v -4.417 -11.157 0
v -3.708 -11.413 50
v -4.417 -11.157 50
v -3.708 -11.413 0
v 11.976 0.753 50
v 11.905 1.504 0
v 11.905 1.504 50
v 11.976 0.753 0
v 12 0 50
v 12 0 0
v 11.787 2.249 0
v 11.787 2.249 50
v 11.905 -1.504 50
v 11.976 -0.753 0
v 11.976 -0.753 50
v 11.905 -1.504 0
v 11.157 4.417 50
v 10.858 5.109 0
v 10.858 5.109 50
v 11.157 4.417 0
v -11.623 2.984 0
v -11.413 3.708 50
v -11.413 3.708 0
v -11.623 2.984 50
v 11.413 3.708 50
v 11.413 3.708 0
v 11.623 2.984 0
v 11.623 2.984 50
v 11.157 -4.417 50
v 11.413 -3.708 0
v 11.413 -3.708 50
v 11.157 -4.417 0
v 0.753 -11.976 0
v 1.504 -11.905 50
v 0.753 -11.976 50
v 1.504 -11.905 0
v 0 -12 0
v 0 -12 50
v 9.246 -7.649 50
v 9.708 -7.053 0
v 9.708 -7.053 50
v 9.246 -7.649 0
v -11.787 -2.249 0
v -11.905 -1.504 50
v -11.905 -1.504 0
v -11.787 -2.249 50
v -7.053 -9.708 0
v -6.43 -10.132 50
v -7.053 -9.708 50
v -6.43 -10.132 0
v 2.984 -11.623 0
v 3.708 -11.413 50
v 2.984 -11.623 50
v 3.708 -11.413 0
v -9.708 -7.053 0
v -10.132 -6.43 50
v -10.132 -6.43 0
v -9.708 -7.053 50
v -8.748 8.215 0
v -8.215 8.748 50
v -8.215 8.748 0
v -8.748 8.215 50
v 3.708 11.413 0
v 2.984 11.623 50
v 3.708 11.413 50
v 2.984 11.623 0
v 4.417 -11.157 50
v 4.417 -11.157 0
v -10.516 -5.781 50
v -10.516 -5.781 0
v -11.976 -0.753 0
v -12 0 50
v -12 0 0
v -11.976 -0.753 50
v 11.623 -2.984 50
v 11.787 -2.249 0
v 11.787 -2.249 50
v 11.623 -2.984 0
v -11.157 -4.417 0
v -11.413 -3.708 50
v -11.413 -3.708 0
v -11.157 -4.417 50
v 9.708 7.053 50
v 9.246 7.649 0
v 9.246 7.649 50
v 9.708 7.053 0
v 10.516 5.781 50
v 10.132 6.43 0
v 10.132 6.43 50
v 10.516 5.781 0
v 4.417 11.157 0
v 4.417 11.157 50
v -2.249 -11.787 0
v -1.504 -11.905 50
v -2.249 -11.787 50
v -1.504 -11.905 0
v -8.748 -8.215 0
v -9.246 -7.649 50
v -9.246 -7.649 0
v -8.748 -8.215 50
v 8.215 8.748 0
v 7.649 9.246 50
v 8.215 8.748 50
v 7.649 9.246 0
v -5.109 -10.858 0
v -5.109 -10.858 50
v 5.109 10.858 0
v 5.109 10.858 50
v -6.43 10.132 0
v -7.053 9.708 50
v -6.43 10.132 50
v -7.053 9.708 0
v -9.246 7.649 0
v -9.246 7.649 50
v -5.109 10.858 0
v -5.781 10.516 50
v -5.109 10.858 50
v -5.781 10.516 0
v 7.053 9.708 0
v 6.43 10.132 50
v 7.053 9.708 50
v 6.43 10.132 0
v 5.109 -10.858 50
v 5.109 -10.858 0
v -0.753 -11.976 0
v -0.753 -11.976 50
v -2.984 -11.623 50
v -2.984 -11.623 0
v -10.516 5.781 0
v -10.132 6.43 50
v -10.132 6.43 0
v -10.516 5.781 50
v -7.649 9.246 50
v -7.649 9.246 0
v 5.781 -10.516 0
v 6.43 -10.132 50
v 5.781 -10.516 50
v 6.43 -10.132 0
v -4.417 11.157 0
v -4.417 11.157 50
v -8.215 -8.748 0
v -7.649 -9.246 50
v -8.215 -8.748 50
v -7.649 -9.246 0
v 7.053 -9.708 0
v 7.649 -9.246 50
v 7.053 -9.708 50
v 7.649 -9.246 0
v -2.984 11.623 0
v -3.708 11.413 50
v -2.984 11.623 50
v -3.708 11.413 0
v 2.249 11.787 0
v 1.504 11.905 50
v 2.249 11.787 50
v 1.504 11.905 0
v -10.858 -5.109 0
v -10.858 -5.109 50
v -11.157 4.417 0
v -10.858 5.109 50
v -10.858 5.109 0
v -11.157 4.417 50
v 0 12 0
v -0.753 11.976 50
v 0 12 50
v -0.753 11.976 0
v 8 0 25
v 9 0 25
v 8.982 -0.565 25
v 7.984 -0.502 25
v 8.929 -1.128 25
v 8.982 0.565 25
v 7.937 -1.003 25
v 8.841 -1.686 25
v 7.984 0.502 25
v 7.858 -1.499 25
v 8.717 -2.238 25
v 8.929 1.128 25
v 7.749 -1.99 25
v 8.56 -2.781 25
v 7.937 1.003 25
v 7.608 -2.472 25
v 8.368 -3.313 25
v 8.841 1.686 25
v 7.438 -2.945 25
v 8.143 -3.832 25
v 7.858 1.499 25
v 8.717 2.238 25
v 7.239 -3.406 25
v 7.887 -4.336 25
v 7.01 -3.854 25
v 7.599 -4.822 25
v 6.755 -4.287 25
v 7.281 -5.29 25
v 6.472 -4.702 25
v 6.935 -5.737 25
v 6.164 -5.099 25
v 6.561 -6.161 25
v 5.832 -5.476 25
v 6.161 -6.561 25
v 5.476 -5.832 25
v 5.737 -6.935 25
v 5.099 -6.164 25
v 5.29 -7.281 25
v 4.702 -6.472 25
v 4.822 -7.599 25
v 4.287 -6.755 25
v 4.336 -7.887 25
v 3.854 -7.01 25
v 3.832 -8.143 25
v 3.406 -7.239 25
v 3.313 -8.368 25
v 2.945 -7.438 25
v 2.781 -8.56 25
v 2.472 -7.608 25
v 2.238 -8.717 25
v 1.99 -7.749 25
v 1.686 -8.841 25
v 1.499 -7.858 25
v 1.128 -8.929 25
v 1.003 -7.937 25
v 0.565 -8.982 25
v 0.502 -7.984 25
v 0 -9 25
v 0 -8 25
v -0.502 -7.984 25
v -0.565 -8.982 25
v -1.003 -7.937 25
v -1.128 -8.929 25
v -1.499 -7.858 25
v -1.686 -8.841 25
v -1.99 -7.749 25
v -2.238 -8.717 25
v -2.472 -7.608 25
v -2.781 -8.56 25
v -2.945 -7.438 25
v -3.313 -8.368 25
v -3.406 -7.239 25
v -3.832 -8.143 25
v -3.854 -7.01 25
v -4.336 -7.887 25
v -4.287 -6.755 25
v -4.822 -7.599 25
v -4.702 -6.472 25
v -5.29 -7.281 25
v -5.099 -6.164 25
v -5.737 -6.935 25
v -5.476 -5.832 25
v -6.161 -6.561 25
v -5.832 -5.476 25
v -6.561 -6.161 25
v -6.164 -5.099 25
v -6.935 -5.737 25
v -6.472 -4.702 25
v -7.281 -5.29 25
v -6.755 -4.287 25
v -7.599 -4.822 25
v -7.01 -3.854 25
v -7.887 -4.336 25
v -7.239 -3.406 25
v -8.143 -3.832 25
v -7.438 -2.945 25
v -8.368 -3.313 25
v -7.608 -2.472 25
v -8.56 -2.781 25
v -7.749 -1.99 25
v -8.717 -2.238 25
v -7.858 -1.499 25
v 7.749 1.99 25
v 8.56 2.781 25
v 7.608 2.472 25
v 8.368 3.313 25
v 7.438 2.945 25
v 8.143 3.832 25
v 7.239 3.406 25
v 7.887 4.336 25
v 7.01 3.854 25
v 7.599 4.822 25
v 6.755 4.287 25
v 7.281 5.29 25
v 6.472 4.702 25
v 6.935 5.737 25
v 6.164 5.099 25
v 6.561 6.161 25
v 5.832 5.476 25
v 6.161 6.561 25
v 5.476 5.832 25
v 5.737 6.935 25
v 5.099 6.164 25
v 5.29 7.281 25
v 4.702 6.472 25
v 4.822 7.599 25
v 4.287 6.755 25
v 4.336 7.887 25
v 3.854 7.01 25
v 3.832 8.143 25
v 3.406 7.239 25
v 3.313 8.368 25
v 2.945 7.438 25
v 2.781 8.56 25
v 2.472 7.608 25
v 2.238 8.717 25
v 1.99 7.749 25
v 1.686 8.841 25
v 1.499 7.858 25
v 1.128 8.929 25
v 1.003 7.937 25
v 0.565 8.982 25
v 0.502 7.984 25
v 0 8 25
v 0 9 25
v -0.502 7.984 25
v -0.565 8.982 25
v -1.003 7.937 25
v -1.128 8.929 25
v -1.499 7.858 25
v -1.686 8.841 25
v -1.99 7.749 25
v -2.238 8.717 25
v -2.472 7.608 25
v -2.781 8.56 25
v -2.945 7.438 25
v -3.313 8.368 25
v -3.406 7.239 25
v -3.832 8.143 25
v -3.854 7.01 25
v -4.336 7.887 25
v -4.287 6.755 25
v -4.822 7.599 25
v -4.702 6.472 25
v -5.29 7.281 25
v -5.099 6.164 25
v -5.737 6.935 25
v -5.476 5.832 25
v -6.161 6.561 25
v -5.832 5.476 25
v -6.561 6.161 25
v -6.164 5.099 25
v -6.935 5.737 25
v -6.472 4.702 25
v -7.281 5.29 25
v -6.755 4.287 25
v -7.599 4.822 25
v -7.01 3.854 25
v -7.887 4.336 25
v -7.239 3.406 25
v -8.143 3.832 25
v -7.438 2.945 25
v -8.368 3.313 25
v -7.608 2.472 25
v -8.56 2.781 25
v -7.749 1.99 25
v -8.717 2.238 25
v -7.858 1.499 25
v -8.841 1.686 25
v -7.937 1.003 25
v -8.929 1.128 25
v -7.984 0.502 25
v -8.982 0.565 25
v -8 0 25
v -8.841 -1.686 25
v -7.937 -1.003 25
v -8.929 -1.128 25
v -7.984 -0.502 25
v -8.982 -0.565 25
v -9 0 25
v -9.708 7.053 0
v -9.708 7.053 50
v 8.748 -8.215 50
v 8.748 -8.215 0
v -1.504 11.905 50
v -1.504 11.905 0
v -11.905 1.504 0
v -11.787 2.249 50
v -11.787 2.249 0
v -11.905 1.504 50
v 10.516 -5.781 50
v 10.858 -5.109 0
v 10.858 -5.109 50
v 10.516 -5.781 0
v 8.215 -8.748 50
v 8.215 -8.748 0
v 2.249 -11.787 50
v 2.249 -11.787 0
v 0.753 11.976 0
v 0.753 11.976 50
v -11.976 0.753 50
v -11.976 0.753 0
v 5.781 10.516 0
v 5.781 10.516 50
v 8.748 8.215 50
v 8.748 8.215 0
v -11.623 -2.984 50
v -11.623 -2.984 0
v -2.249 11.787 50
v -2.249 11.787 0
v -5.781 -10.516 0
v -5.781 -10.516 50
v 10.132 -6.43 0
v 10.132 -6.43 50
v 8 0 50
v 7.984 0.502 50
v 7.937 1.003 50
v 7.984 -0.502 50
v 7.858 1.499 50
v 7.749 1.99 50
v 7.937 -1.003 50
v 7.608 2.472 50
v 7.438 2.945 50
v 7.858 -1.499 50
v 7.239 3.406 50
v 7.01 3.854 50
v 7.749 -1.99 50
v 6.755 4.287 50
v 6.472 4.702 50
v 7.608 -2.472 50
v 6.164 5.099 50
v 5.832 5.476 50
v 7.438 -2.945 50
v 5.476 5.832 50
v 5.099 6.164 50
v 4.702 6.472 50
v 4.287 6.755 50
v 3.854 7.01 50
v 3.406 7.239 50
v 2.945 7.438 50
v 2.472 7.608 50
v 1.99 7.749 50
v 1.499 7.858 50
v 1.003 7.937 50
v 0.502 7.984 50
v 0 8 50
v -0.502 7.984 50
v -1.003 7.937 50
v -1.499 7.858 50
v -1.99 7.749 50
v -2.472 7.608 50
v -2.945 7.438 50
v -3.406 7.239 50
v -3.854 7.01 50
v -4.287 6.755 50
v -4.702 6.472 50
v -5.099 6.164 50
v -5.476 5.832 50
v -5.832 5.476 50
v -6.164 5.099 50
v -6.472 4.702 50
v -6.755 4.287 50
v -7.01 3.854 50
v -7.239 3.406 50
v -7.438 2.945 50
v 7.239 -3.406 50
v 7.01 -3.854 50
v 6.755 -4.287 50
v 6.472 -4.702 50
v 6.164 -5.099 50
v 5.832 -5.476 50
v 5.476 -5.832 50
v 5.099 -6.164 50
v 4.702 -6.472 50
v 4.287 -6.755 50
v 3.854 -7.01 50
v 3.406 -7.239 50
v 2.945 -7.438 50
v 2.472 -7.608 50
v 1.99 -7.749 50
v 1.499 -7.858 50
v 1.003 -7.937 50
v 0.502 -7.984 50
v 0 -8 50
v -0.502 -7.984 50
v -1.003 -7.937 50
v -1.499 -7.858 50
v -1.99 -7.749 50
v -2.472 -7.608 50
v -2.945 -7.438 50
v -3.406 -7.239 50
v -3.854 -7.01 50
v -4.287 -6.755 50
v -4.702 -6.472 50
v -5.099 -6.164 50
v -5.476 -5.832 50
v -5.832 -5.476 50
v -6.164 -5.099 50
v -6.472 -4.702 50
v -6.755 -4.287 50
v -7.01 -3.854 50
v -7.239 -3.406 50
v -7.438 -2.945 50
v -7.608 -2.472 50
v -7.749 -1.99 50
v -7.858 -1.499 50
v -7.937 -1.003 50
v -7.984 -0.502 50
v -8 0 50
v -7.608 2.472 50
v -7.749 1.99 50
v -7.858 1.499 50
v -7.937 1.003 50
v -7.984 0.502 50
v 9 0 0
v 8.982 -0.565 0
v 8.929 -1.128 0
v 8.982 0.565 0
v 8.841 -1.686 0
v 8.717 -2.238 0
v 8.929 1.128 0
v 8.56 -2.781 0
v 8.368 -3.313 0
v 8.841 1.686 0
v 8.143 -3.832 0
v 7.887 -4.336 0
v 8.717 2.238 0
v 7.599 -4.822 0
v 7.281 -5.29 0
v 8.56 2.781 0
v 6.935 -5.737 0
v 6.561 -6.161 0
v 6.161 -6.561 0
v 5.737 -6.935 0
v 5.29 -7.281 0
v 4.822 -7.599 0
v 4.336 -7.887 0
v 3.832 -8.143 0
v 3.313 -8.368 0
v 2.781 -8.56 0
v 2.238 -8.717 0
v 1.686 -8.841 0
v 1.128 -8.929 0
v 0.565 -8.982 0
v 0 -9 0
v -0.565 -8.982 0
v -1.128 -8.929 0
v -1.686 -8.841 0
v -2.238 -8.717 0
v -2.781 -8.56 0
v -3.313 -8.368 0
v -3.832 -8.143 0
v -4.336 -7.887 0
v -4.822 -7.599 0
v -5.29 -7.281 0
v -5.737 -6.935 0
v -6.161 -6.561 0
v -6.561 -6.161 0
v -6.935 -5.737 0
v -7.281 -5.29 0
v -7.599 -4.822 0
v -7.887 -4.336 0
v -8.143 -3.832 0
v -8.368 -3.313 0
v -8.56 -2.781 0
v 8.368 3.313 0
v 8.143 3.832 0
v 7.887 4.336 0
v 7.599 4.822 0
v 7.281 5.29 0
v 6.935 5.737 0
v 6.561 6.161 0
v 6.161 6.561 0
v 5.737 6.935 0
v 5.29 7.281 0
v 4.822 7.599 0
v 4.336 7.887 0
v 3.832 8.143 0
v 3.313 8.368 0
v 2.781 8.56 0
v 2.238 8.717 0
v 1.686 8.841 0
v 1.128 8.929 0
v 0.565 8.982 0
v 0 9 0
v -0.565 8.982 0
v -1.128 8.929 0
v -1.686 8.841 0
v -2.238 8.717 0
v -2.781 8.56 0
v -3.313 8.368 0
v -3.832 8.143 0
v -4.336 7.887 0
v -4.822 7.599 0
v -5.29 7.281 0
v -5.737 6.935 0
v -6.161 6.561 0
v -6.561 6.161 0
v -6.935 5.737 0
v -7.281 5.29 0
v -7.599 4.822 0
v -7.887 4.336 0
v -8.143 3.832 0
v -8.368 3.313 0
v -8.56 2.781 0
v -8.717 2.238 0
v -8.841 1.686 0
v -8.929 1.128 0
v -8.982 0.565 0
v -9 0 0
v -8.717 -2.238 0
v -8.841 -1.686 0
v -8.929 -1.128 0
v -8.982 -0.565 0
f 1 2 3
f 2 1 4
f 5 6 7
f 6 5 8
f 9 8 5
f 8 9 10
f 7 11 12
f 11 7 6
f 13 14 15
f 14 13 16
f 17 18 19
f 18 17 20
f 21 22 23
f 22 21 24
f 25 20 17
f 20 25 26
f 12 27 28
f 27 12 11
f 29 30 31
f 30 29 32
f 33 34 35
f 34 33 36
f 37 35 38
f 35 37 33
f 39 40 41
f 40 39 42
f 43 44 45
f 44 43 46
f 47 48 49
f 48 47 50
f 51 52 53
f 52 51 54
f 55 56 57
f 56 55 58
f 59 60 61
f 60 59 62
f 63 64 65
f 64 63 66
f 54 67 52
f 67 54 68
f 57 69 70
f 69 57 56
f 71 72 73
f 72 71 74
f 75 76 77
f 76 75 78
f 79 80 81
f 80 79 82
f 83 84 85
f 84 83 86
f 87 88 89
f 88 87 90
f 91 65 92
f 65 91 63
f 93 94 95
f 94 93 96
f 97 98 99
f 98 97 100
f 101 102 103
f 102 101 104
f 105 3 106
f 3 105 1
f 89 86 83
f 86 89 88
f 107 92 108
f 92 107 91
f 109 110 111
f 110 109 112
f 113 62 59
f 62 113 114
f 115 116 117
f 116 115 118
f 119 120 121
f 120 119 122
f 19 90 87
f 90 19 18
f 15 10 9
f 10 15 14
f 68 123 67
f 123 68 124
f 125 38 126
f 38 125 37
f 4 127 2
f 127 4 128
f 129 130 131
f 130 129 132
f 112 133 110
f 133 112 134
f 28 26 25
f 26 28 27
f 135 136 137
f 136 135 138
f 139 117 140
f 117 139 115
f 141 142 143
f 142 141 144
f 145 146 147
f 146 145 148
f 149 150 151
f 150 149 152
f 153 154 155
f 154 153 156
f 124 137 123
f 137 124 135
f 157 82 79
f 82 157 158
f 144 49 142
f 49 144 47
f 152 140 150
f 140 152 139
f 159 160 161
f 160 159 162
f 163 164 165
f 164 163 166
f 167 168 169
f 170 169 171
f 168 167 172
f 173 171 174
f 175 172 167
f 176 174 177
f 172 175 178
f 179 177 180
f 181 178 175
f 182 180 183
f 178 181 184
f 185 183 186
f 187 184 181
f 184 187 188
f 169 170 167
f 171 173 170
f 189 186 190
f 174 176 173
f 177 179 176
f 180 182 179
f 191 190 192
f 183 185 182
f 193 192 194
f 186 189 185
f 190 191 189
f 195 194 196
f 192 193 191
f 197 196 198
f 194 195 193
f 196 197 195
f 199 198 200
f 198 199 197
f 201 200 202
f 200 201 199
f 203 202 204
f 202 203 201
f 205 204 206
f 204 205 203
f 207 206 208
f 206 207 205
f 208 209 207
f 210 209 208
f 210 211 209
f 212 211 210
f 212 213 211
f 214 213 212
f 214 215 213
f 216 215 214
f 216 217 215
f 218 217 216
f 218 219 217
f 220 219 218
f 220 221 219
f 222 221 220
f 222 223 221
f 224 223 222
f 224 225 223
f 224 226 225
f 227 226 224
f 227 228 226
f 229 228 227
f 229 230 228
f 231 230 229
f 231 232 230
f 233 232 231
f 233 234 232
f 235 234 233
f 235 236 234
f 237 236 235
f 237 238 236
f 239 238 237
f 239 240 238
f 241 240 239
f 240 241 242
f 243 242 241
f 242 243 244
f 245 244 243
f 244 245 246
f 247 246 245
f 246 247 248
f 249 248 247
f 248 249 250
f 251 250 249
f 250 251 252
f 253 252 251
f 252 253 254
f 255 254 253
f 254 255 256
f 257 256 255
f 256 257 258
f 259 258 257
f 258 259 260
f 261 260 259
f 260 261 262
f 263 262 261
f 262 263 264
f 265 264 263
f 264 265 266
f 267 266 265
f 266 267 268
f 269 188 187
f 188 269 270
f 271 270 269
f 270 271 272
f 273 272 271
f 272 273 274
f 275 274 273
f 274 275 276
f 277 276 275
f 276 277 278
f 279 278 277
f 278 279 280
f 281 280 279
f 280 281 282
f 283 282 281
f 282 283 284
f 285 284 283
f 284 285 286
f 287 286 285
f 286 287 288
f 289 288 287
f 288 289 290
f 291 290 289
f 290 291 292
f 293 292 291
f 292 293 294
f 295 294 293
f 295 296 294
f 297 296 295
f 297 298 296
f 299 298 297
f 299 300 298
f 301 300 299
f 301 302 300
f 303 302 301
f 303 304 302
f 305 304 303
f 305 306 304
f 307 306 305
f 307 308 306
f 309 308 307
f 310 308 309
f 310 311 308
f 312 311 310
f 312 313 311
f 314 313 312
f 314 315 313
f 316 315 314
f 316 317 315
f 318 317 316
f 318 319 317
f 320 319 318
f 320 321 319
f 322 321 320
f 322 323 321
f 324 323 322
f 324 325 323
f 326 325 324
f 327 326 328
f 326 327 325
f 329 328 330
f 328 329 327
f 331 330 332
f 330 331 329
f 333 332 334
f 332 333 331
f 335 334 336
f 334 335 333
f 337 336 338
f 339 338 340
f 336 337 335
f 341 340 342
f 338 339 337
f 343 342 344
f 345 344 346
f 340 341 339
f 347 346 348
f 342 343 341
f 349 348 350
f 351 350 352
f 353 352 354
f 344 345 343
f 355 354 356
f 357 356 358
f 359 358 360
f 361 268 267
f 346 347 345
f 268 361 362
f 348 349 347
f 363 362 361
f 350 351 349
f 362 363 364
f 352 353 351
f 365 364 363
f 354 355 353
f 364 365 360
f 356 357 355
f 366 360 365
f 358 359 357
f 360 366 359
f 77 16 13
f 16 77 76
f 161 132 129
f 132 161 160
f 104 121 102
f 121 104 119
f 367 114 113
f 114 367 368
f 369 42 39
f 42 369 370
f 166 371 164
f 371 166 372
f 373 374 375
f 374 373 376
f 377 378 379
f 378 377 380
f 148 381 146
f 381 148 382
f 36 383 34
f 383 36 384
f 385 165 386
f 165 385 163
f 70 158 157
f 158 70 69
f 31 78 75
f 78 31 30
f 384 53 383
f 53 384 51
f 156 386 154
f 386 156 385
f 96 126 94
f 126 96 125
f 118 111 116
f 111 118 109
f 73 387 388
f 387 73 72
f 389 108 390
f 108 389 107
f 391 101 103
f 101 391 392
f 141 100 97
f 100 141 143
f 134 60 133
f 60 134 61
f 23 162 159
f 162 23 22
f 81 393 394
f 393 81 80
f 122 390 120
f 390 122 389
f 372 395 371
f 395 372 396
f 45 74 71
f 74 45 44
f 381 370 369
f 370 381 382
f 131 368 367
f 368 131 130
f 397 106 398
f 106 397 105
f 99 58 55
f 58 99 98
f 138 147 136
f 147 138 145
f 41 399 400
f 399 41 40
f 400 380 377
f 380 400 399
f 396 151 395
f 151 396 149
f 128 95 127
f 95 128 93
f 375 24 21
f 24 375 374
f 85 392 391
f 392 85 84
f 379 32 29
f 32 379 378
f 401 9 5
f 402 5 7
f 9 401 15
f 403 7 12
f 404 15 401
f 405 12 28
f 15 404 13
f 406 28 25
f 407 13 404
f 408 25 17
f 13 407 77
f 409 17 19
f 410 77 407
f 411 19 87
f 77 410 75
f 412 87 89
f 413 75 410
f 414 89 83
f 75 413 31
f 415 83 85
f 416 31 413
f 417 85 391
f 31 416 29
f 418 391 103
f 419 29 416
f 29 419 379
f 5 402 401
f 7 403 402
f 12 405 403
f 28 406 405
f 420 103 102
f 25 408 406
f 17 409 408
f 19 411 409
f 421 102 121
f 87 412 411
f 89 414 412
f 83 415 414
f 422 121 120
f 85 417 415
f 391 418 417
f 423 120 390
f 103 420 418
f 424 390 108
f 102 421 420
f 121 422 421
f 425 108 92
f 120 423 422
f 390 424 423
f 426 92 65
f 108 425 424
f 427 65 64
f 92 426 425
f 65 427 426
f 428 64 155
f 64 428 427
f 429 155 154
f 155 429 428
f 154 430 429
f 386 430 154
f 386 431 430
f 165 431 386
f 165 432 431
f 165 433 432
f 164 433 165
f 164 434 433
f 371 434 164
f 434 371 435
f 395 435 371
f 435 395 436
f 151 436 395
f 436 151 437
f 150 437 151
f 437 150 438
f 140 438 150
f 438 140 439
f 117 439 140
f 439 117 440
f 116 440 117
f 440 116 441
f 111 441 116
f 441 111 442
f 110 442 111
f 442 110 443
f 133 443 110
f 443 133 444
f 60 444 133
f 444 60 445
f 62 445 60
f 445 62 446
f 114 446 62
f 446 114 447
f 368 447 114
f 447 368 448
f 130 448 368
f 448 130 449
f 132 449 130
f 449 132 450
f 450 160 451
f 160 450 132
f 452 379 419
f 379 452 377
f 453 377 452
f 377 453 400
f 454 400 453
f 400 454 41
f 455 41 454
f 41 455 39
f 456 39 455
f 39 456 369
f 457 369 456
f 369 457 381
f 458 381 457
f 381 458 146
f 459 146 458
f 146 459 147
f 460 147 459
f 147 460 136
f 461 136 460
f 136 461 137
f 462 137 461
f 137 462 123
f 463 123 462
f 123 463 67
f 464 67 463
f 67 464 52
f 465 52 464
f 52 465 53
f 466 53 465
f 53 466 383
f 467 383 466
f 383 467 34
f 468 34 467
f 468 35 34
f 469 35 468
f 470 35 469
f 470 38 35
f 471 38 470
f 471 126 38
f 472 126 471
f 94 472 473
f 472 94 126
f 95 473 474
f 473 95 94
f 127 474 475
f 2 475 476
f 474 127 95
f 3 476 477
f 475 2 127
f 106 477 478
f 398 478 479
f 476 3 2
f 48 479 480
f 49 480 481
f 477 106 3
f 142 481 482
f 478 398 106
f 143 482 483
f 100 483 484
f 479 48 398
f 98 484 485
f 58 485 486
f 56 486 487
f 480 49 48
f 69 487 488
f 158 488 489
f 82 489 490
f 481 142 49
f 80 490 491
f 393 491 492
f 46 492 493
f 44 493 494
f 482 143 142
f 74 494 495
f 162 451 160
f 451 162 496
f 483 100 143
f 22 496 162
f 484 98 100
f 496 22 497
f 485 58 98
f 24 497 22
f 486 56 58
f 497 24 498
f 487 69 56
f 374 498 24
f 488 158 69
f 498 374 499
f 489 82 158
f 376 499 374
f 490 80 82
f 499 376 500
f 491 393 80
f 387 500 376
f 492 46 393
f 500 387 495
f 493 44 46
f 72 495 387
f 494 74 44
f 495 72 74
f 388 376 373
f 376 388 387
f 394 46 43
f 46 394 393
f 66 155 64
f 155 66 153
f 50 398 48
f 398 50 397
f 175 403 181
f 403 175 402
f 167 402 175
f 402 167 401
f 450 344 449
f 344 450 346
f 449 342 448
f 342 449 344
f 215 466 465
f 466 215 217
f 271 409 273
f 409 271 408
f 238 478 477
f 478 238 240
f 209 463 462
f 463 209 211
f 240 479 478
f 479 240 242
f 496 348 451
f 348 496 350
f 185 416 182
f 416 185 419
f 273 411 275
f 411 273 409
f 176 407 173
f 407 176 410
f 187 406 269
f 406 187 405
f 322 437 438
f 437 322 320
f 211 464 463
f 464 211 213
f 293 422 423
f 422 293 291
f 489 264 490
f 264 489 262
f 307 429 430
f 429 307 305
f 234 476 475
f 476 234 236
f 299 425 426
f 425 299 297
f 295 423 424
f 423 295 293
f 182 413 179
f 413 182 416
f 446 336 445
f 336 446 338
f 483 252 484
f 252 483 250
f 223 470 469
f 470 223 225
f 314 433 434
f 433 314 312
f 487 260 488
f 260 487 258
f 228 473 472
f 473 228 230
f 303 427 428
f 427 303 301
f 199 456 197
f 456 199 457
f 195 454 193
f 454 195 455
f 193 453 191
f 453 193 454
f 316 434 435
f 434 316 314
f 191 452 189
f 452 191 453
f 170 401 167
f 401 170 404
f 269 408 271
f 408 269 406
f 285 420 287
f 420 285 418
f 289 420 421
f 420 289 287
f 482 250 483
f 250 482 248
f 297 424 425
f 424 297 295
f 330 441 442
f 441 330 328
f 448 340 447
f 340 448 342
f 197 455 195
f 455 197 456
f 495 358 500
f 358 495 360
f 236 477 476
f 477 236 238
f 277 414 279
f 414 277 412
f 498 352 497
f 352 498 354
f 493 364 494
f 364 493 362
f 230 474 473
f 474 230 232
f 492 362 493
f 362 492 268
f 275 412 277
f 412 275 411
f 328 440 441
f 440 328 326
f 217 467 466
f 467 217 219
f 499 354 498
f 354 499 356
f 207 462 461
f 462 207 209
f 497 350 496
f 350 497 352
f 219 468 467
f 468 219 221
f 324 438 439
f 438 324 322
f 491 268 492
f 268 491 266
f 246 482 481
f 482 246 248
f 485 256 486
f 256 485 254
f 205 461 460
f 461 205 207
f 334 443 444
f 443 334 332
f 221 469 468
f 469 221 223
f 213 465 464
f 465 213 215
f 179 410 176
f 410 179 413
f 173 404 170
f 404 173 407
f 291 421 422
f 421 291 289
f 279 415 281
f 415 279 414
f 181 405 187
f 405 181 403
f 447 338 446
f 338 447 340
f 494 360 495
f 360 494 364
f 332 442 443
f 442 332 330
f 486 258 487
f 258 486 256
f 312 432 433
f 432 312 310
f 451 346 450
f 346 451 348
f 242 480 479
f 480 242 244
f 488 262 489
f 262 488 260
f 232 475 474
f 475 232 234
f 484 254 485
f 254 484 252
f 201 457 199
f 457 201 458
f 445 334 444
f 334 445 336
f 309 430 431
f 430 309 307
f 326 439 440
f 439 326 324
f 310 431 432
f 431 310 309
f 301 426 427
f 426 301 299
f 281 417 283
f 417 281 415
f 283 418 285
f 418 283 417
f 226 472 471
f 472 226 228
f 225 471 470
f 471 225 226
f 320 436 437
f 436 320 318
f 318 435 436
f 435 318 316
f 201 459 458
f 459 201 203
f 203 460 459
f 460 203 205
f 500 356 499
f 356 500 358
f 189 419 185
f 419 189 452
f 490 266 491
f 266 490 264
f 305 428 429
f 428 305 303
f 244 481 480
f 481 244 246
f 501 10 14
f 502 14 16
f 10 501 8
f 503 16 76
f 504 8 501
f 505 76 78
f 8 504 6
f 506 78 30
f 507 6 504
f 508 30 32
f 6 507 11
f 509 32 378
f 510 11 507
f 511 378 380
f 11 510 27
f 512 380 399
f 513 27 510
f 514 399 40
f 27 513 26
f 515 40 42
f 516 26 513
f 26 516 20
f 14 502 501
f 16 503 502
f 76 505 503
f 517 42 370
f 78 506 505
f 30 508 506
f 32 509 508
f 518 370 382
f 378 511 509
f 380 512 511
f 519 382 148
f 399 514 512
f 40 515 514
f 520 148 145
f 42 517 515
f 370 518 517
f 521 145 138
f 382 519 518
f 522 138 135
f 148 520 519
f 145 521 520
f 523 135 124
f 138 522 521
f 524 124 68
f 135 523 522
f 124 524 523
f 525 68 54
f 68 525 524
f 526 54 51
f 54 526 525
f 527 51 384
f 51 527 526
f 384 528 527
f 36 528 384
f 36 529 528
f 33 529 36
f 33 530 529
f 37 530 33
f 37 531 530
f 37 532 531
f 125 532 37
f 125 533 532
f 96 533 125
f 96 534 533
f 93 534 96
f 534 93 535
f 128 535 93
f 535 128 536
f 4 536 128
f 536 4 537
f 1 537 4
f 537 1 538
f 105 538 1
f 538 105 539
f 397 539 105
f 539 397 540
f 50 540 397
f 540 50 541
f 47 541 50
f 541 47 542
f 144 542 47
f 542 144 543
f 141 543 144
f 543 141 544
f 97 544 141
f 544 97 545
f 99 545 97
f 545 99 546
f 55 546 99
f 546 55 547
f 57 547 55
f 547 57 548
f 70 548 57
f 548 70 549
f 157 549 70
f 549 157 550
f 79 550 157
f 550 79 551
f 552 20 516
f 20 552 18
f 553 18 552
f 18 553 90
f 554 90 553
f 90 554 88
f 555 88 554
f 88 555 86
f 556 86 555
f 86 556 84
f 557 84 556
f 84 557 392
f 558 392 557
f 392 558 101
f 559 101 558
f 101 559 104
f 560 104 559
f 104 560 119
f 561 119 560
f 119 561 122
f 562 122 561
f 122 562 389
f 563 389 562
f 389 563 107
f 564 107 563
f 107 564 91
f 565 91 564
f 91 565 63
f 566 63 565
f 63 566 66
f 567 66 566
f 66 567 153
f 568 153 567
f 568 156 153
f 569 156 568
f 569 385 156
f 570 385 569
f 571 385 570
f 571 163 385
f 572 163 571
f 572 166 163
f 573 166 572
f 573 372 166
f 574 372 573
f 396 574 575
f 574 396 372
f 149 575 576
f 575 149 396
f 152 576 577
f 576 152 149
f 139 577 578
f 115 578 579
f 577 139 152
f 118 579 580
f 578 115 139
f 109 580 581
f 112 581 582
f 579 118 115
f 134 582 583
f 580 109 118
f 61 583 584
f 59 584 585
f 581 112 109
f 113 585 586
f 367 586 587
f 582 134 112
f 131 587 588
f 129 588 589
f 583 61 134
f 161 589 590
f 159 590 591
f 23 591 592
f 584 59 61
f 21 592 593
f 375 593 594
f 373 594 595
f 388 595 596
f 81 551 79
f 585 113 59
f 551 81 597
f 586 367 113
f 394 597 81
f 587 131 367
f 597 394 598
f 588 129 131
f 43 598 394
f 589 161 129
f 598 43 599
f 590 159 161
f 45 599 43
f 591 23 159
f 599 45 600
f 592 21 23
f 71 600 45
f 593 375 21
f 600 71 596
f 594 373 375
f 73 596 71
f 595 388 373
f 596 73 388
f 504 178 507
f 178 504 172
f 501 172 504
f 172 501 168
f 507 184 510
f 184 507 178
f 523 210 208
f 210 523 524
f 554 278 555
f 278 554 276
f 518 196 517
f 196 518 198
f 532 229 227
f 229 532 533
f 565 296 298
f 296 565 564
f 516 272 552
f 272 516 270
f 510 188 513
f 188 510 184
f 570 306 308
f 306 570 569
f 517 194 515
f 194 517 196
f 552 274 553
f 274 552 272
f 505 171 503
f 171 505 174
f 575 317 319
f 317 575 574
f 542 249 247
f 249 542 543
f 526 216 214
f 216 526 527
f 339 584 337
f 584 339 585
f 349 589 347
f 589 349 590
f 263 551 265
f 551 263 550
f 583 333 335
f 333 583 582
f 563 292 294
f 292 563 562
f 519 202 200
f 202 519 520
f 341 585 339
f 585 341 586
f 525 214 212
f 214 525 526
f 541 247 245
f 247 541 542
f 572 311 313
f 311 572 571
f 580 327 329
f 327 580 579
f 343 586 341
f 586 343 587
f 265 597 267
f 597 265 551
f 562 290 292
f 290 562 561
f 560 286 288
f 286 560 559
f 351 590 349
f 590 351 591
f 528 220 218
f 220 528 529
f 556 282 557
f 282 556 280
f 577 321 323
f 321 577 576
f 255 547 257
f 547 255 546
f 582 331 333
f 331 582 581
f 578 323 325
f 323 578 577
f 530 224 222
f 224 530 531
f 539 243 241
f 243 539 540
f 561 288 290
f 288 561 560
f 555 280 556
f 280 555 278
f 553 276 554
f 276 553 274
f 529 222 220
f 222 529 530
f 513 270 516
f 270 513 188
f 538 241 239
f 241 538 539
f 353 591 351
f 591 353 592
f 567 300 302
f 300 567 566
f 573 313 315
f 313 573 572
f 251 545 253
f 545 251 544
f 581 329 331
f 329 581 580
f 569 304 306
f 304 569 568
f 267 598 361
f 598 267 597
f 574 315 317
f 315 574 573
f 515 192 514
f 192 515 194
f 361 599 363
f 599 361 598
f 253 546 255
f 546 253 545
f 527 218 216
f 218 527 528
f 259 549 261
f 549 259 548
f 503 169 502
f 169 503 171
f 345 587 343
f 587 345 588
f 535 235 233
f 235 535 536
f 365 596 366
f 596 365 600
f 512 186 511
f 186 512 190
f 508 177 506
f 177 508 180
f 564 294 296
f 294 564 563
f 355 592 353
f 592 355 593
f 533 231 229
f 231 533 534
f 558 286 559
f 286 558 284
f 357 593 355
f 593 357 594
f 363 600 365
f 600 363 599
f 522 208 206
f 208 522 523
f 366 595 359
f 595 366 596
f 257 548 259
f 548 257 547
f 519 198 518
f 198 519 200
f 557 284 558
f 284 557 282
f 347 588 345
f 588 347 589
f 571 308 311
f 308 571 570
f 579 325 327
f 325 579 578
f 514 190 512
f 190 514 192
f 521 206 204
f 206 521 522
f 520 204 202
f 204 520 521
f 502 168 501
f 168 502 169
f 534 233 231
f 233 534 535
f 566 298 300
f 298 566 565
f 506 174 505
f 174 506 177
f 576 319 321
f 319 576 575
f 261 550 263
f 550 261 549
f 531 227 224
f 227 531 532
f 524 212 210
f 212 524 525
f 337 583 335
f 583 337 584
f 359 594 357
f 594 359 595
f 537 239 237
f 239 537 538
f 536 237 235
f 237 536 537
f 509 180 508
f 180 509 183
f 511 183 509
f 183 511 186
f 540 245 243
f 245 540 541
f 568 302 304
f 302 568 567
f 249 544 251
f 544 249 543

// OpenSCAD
// file: ../../../../../../../shapes/open-cylinder/open-cylinder.scad
// TODO: Lower this to 50.
module openCylinder(height = 3,
                    outerRadius = 7,
                    innerRadius = 4.5,
                    fn = 100)
{
    $fn = fn;

    difference()
    {
        cylinder(r=outerRadius,
                 h=height);

        translate([0, 0, -1])
        cylinder(r=innerRadius,
                 h=height+1.01);
    }
}
// file: ../../../../variable-diameter-round-connector.scad
use <../../../shapes/open-cylinder/open-cylinder.scad>

module roundConnector(bottomHeight = 10,
					  bottomInnerRadius = 4.5,
					  bottomOuterRadius = 7,
					  middleHeight = 10,
					  middleInnerRadius = 4.5,
					  middleOuterRadius = 15,
					  topHeight = 10,
					  topInnerRadius = 4.5,
				  	  topOuterRadius = 7)
{
	union()
	{
		color("teal")
		translate([0, 0, bottomHeight + middleHeight])
		roundConnector_top(height = topHeight,
						   innerRadius = topInnerRadius,
						   outerRadius = topOuterRadius);

		color("magenta")
		translate([0, 0, bottomHeight])
		roundConnector_middle(height = middleHeight,
							  innerRadius = middleInnerRadius,
							  outerRadius = middleOuterRadius);

		color("blue")
		roundConnector_Bottom(height = bottomHeight,
							  innerRadius = bottomInnerRadius,
							  outerRadius = bottomOuterRadius);
	}
}

module roundConnector_top(height, innerRadius, outerRadius)
{
	openCylinder(height = height,
				 innerRadius = innerRadius,
				 outerRadius = outerRadius);
}

module roundConnector_middle(height, innerRadius, outerRadius)
{
	openCylinder(height = height,
				 innerRadius = innerRadius,
				 outerRadius = outerRadius);
}

module roundConnector_Bottom(height, innerRadius, outerRadius)
{
	openCylinder(height = height,
				 innerRadius = innerRadius,
				 outerRadius = outerRadius);
}
// main file
use <../../../../variable-diameter-round-connector.scad>

roundConnector(bottomHeight = 25,
			  bottomInnerRadius = 9,
			  bottomOuterRadius = 12,
			  middleHeight = 0,
			  topHeight = 25,
			  topInnerRadius = 8,
		  	  topOuterRadius = 12);
